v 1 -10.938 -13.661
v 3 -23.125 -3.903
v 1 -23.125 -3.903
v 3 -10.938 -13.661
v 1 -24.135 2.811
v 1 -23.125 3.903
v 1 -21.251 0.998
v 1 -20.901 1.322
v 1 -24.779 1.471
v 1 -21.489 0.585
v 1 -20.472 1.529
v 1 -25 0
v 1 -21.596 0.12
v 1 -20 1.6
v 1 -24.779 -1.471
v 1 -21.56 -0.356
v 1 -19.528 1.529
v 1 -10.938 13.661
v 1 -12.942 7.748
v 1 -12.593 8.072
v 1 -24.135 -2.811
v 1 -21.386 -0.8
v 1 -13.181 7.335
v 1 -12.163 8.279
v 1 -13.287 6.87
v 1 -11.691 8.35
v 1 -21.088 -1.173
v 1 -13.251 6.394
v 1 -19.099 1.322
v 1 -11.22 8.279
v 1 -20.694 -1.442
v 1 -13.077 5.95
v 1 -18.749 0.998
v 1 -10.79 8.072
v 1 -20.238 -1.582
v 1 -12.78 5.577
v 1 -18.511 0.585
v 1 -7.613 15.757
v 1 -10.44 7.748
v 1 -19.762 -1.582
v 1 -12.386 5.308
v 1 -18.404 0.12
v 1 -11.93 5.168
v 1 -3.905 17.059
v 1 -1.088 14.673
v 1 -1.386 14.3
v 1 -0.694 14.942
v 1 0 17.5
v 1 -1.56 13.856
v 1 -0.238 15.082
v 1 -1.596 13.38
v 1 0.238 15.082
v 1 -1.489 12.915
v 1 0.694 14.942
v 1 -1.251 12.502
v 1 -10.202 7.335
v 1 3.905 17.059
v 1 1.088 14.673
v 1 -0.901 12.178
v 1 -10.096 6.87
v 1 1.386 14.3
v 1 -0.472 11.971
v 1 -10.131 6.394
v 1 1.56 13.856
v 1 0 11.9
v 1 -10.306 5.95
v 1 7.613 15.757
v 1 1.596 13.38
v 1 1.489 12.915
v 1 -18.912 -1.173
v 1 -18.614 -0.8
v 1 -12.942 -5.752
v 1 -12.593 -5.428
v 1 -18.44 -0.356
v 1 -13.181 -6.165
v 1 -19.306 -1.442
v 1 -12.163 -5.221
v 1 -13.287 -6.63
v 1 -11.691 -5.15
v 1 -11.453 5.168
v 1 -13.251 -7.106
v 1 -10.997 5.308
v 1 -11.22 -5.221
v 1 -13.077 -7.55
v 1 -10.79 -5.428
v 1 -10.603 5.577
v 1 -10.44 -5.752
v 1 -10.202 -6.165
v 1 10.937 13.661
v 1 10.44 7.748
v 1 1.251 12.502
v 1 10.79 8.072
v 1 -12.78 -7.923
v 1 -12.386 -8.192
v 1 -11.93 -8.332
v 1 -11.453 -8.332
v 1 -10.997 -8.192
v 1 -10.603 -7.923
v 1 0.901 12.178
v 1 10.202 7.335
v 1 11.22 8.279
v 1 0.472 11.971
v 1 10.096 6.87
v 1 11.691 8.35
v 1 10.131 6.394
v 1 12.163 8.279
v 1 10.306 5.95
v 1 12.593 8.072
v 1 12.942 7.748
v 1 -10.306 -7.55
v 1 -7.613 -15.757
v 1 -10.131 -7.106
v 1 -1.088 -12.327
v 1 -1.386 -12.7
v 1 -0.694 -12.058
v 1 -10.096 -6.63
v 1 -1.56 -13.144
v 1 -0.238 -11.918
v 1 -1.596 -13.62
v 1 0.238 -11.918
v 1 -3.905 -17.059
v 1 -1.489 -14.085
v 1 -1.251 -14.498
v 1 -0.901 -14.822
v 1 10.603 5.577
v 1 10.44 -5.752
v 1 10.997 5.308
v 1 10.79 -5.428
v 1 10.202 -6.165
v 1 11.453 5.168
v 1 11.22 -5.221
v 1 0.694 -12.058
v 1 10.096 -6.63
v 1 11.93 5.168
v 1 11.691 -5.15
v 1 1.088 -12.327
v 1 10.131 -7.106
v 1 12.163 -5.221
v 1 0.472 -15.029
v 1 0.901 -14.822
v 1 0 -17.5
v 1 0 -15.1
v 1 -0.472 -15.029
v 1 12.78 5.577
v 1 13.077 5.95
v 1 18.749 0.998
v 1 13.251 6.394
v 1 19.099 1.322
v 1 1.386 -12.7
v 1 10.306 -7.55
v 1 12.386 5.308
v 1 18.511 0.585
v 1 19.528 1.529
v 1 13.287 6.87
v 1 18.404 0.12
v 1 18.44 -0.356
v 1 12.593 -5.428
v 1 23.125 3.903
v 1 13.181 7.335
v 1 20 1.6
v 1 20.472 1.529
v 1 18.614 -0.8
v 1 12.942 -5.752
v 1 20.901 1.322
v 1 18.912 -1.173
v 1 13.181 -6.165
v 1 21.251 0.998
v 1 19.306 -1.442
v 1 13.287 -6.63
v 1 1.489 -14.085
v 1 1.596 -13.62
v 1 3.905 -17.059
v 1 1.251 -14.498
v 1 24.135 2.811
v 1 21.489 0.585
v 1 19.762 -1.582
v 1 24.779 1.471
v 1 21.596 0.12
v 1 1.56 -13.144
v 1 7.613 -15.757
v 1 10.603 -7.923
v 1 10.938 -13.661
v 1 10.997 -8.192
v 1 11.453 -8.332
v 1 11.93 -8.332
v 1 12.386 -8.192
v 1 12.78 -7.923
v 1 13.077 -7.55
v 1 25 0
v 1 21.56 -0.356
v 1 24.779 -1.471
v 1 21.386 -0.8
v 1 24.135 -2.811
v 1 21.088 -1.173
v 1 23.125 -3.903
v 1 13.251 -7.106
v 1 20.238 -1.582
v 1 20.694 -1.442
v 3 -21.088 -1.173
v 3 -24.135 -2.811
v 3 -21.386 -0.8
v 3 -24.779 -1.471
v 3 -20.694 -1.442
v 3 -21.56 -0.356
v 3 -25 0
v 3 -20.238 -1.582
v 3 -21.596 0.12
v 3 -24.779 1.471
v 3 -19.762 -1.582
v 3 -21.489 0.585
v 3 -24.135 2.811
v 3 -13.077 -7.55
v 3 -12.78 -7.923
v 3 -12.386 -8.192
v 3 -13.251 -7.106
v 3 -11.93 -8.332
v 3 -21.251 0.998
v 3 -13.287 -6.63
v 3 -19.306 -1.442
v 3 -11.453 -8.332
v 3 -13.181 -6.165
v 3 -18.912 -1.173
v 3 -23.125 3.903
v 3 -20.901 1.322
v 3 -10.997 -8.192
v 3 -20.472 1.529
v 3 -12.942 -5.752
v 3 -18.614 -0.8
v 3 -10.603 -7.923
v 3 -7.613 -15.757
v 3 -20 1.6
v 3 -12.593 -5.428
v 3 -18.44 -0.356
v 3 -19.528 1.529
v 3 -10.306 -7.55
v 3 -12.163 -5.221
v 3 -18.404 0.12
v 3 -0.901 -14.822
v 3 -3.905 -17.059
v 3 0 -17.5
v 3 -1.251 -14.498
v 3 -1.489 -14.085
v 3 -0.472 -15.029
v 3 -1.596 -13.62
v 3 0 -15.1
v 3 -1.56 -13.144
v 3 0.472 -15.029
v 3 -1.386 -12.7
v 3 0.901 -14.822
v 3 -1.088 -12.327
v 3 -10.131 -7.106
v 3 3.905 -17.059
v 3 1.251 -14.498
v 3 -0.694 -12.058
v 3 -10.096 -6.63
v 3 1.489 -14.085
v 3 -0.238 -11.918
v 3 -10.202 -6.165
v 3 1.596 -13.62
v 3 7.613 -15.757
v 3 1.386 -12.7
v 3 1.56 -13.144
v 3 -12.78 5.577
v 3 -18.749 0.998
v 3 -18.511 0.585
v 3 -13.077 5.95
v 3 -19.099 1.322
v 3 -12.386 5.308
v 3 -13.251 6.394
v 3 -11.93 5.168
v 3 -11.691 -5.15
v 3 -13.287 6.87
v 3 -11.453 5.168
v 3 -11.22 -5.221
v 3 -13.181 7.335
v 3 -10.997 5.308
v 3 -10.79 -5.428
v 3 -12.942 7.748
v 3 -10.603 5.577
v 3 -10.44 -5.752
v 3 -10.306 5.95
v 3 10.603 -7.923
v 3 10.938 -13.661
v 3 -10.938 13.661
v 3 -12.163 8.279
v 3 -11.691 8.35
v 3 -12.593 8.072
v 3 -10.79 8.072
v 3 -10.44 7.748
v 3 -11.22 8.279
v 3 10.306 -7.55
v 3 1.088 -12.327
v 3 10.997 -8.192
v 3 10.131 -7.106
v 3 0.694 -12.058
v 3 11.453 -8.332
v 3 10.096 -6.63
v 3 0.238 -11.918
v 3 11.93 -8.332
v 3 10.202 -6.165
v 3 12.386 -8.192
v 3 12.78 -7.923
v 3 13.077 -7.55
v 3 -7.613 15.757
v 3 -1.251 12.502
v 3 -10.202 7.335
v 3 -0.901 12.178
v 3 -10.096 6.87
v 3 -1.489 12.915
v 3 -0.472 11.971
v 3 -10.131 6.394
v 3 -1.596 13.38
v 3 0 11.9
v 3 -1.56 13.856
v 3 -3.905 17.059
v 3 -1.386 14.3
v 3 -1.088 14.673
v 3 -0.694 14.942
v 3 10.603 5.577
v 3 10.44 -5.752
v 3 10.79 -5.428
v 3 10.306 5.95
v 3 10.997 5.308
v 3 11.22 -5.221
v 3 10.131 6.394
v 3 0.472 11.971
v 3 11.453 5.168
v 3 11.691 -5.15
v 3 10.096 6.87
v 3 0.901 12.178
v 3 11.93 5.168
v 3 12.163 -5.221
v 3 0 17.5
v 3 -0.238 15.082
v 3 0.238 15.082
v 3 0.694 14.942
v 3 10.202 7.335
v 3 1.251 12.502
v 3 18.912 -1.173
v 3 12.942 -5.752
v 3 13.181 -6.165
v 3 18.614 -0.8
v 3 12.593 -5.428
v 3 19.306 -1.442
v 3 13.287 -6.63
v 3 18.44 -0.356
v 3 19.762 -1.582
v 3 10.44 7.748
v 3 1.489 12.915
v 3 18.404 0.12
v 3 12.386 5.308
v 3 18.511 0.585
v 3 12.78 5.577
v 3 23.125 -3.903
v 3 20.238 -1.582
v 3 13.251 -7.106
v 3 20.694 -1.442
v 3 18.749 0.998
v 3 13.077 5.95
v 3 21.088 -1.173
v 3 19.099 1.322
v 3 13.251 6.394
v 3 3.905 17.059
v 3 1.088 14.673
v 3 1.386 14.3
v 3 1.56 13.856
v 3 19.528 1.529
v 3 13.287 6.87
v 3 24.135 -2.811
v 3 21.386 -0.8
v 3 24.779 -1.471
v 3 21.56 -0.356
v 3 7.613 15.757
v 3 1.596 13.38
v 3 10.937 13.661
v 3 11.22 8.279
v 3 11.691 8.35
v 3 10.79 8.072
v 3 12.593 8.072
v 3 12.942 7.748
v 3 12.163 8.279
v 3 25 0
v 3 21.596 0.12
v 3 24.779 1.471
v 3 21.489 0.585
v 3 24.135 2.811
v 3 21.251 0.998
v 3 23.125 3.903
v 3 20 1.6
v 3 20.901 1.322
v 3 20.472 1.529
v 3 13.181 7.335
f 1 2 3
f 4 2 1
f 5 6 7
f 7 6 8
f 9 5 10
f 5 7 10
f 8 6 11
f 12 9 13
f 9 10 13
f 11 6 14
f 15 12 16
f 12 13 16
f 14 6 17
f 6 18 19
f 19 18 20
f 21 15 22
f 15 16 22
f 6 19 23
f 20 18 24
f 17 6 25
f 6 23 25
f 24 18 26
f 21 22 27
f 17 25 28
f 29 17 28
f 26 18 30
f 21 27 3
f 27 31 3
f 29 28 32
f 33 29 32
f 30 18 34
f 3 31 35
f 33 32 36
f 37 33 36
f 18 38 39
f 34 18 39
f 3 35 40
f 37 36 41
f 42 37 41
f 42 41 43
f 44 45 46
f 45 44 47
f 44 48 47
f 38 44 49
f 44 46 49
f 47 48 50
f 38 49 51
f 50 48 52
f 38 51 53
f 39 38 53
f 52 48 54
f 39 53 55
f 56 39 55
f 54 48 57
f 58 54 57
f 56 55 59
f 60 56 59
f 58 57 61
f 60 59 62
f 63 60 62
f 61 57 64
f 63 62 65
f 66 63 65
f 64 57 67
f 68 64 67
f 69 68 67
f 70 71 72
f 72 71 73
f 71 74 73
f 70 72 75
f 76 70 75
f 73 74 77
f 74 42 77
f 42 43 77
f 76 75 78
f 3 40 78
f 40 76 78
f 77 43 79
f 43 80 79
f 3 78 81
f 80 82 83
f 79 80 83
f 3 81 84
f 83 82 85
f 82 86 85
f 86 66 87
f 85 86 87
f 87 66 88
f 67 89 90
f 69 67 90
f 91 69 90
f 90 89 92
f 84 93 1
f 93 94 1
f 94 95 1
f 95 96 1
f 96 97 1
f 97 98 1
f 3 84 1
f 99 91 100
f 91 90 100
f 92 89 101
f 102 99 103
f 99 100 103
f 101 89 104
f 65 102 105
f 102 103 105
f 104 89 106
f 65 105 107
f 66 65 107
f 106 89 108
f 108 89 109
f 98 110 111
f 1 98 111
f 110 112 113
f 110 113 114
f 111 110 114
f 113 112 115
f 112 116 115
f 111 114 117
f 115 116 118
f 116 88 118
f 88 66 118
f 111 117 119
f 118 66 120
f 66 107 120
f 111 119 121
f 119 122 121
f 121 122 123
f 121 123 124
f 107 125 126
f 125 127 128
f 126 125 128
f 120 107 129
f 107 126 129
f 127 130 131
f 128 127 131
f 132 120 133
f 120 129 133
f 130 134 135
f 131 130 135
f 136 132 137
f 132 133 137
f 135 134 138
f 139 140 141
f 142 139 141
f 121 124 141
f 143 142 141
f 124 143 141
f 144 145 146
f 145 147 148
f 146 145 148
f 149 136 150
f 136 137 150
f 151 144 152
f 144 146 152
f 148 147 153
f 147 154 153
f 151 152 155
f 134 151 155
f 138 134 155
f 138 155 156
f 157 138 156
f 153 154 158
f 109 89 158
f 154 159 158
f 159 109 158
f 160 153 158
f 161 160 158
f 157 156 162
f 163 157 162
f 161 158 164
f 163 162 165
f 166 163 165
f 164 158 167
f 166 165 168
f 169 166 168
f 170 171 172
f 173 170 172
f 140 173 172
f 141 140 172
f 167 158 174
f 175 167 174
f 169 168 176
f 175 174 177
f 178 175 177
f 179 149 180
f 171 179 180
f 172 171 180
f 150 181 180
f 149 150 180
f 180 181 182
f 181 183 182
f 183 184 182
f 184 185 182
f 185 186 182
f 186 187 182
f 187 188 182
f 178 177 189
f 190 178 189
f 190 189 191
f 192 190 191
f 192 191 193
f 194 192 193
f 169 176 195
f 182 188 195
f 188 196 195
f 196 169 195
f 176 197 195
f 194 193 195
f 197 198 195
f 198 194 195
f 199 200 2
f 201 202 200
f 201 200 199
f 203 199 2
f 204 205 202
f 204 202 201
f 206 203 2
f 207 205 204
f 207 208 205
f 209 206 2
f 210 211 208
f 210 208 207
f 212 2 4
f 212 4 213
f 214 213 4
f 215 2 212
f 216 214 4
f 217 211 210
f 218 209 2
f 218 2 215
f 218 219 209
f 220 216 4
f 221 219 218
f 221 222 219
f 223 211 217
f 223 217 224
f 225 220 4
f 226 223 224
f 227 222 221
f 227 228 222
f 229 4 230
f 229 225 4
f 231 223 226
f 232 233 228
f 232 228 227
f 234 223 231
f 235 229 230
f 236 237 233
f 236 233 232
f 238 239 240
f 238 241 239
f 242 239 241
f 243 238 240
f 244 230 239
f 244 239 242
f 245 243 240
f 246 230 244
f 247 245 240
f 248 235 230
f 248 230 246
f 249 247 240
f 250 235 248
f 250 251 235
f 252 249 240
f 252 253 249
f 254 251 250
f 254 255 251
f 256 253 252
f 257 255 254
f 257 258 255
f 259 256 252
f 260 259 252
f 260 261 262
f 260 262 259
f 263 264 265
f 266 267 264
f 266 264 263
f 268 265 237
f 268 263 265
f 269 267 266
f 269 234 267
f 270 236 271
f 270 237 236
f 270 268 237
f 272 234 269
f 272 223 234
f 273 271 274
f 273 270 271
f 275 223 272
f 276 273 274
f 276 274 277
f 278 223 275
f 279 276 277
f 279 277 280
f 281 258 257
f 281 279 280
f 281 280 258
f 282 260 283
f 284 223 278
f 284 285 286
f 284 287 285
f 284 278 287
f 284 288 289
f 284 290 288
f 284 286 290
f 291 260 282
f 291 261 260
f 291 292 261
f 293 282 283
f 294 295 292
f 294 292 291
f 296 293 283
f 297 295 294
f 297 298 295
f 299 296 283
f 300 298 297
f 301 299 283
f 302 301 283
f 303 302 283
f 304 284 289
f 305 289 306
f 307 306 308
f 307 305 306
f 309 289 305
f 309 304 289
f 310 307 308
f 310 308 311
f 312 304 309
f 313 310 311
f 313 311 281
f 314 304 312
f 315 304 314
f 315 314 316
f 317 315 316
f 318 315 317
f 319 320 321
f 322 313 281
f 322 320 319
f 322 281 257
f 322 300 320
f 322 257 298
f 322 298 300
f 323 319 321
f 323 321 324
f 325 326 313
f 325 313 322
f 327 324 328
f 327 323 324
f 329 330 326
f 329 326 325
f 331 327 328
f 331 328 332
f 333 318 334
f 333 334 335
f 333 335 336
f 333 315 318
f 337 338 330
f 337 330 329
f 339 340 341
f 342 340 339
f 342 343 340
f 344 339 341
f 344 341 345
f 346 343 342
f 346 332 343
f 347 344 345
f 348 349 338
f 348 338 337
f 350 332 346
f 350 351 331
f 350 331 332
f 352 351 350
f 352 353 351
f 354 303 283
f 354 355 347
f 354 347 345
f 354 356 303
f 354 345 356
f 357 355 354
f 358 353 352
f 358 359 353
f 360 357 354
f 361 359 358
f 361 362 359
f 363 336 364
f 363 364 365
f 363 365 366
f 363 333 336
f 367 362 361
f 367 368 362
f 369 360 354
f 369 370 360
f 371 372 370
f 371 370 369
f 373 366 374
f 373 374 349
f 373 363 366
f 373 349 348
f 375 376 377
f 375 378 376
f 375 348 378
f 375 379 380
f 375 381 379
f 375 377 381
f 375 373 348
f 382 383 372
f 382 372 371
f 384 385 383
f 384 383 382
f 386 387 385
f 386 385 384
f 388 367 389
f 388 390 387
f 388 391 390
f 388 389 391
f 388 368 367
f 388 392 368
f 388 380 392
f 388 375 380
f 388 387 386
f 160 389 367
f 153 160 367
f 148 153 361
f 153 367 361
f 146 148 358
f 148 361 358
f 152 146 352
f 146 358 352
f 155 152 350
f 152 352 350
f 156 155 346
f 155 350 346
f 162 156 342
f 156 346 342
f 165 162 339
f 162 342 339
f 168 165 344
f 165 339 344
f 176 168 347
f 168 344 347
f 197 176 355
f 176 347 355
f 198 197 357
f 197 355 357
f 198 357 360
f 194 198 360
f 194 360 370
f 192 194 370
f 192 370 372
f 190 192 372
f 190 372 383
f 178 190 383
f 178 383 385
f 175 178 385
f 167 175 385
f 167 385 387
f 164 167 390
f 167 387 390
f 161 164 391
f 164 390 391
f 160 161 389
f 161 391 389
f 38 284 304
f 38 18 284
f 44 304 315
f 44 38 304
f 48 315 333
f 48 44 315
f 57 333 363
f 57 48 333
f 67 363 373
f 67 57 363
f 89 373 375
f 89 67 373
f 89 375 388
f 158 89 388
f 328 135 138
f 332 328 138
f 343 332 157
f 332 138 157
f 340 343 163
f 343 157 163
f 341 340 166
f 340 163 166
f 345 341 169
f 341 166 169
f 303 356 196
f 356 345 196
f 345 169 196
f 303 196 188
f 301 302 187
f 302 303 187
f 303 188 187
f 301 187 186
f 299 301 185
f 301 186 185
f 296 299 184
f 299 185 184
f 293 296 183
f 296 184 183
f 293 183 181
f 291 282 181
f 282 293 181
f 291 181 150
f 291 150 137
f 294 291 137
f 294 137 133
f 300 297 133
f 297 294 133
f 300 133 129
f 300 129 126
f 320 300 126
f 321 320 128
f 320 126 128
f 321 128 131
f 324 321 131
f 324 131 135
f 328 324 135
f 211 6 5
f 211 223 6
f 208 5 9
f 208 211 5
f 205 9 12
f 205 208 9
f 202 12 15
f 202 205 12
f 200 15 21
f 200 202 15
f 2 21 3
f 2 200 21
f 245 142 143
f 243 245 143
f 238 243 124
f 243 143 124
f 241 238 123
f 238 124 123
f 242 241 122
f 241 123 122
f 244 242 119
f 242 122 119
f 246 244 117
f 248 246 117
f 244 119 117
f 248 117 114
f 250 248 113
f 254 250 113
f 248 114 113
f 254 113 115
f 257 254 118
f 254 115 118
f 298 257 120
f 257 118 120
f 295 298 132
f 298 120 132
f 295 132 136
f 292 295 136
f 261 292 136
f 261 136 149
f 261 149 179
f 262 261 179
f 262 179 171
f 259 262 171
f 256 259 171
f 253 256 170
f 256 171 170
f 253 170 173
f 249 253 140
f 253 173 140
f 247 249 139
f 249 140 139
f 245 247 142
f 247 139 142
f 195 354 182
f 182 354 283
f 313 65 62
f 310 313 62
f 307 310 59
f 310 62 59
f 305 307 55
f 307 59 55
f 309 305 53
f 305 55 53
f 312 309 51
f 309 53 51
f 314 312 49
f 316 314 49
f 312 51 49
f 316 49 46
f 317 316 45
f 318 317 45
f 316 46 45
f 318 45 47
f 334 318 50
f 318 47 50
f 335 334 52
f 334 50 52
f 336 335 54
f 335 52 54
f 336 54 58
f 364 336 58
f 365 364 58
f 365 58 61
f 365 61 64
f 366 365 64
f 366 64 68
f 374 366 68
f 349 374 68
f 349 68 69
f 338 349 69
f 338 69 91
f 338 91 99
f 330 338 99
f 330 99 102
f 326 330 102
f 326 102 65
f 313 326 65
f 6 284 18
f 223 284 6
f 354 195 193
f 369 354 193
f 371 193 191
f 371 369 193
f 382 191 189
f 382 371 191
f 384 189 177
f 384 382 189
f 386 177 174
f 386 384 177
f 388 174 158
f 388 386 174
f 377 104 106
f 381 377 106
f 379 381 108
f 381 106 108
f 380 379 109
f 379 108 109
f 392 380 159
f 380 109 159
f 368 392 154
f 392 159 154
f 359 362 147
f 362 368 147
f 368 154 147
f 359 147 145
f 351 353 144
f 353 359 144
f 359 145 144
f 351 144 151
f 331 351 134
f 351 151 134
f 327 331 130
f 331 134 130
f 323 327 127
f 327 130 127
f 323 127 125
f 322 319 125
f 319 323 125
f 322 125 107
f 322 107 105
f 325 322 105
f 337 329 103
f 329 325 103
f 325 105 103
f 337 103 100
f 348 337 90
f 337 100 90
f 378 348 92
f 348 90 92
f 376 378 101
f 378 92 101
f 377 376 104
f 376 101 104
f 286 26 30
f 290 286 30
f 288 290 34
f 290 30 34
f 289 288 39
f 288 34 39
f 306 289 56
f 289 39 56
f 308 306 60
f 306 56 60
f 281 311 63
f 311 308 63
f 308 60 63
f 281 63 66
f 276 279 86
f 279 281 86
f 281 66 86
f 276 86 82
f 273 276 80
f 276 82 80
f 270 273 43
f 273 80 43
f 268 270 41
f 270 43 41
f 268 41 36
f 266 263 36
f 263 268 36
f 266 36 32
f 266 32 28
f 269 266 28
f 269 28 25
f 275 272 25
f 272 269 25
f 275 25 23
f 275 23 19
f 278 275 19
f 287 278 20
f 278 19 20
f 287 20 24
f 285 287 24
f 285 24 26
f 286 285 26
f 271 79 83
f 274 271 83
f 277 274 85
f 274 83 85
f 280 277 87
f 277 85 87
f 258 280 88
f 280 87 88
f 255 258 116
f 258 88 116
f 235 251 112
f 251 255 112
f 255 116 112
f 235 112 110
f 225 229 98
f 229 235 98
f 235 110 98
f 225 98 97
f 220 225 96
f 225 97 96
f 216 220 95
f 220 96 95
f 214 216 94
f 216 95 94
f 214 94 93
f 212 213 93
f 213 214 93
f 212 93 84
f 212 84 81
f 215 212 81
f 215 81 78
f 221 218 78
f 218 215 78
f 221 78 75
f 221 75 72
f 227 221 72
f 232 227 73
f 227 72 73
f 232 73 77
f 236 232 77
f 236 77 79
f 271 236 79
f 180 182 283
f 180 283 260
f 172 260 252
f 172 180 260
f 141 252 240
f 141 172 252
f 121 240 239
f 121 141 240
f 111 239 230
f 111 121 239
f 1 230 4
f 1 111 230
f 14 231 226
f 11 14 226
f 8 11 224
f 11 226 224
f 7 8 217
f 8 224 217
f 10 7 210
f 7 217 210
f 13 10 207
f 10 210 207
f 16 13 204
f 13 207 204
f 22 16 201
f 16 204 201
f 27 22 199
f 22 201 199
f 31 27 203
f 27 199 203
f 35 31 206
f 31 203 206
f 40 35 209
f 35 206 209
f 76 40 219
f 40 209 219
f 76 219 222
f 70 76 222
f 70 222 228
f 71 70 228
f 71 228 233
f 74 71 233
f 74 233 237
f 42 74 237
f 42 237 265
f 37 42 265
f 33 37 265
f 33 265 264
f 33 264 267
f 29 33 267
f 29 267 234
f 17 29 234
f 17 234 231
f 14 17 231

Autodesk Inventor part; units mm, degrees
ref_plane "YZ Plane" through (0, 0, 0) normal (1, 0, 0) x (0, 1, 0)
ref_plane "XZ Plane" through (0, 0, 0) normal (0, 1, 0) x (-1, 0, 0)
ref_plane "XY Plane" through (0, 0, 0) normal (0, 0, 1) x (1, 0, 0)
sketch "スケッチ1" plane through (0, 0, 0) normal (1, 0, 0) x (0, 1, 0)
  circle A0 centre (0, 0) radius 17.5
  dimension "d0" = 35
extrude "押し出し1" add sketch "スケッチ1" along normal blind 3
sketch "スケッチ2" plane through (3, 0, 0) normal (1, 0, 0) x (0, 0, -1)
  circle A0 centre (0, 0) radius 13.5
  point P0 (13.5, 0)
  point P1 (6.75, 11.6913)
  point P2 (-6.75, 11.6913)
  point P3 (-13.5, 0)
  point P4 (-6.75, -11.6913)
  point P5 (6.75, -11.6913)
  dimension "d3" = 27
  dimension "d6" = 360
hole "穴1" at (3, 0, -13.5) at (3, 11.6913, -6.75) at (3, 11.6913, 6.75) at (3, 0, 13.5) at (3, -11.6913, 6.75) at (3, -11.6913, -6.75) direction (-1, 0, 0) diameter 3.2 end through all
sketch "スケッチ4" plane through (3, 0, 0) normal (1, 0, 0) x (0, 0, -1)
  circle A0 centre (0, 0) radius 20
  circle A1 centre (0, -20) radius 5
  circle A2 centre (0, 20) radius 5
  circle A3 centre (13.5, 0) radius 1.6 projected
  circle A4 centre (-13.5, 0) radius 1.6 projected
  line L0 (-24.9861, -3.2077) -> (0.509, 28.6357)
  line L1 (1.3172, 26.3548) -> (24.4586, -2.5487)
  line L2 (-28.3137, 7.3638) -> (1.2125, -29.5144)
  line L3 (-0.4955, -28.6189) -> (23.5579, 1.4238)
  circle A5 centre (0, 0) radius 17.5 projected
  point P0 (-3.9031, 23.125)
  point P1 (-13.6609, 10.9375)
  point P2 (-13.6609, -10.9375)
  point P3 (-3.9031, -23.125)
  point P4 (3.9031, -23.125)
  point P5 (13.6609, -10.9375)
  point P6 (13.6609, 10.9375)
  point P7 (3.9031, 23.125)
  dimension "d22" = 40
  dimension "d23" = 10
  dimension "d24" = 10
  dimension "d25" = 13.5
  dimension "d26" = 13.5
extrude "押し出し2" add sketch "スケッチ4" against normal blind 2 contours L1 A5 A2 A0 | A0 A2 L1 | A5 A1 A2 | L3 A1 A0 | A0 A1 A5 L3 | A2 A5 A0 | A0 A2 | A2 A5 | A1 A0 | A0 A1 A5 | A5 A1 | A2 A5 L0 A0 | A0 L0 A2 | A1 L2 A0 | A0 L2 A5 A1
sketch "スケッチ5" plane through (0, 0, 0) normal (-1, 0, 0) x (0, 0, 1)
  circle A0 centre (6.75, -11.6913) radius 1.6 projected
  circle A1 centre (-6.75, -11.6913) radius 1.6 projected
  circle A2 centre (-6.75, 11.6913) radius 1.6 projected
  circle A3 centre (6.75, 11.6913) radius 1.6 projected
  arc A4 (3.9031, 23.125) -> (-3.9031, 23.125) centre (0, 20) ccw projected
  arc A5 (-3.9031, -23.125) -> (3.9031, -23.125) centre (0, -20) ccw projected
  point P0 (0, 0)
hole "穴2" at (0, -11.6913, 6.75) at (0, -11.6913, -6.75) at (0, 11.6913, -6.75) at (0, 11.6913, 6.75) at (0, 20, 0) at (0, -20, 0) direction (1, 0, 0) diameter 3.2 depth 5
sketch "スケッチ6" plane through (0, 0, 0) normal (-1, 0, 0) x (0, 0, 1)
  circle A0 centre (0, 0) radius 17.5
extrude "押し出し3" cut sketch "スケッチ6" against normal blind 1
properties part number "endeff_plate2" material "アルミニウム 6061"
